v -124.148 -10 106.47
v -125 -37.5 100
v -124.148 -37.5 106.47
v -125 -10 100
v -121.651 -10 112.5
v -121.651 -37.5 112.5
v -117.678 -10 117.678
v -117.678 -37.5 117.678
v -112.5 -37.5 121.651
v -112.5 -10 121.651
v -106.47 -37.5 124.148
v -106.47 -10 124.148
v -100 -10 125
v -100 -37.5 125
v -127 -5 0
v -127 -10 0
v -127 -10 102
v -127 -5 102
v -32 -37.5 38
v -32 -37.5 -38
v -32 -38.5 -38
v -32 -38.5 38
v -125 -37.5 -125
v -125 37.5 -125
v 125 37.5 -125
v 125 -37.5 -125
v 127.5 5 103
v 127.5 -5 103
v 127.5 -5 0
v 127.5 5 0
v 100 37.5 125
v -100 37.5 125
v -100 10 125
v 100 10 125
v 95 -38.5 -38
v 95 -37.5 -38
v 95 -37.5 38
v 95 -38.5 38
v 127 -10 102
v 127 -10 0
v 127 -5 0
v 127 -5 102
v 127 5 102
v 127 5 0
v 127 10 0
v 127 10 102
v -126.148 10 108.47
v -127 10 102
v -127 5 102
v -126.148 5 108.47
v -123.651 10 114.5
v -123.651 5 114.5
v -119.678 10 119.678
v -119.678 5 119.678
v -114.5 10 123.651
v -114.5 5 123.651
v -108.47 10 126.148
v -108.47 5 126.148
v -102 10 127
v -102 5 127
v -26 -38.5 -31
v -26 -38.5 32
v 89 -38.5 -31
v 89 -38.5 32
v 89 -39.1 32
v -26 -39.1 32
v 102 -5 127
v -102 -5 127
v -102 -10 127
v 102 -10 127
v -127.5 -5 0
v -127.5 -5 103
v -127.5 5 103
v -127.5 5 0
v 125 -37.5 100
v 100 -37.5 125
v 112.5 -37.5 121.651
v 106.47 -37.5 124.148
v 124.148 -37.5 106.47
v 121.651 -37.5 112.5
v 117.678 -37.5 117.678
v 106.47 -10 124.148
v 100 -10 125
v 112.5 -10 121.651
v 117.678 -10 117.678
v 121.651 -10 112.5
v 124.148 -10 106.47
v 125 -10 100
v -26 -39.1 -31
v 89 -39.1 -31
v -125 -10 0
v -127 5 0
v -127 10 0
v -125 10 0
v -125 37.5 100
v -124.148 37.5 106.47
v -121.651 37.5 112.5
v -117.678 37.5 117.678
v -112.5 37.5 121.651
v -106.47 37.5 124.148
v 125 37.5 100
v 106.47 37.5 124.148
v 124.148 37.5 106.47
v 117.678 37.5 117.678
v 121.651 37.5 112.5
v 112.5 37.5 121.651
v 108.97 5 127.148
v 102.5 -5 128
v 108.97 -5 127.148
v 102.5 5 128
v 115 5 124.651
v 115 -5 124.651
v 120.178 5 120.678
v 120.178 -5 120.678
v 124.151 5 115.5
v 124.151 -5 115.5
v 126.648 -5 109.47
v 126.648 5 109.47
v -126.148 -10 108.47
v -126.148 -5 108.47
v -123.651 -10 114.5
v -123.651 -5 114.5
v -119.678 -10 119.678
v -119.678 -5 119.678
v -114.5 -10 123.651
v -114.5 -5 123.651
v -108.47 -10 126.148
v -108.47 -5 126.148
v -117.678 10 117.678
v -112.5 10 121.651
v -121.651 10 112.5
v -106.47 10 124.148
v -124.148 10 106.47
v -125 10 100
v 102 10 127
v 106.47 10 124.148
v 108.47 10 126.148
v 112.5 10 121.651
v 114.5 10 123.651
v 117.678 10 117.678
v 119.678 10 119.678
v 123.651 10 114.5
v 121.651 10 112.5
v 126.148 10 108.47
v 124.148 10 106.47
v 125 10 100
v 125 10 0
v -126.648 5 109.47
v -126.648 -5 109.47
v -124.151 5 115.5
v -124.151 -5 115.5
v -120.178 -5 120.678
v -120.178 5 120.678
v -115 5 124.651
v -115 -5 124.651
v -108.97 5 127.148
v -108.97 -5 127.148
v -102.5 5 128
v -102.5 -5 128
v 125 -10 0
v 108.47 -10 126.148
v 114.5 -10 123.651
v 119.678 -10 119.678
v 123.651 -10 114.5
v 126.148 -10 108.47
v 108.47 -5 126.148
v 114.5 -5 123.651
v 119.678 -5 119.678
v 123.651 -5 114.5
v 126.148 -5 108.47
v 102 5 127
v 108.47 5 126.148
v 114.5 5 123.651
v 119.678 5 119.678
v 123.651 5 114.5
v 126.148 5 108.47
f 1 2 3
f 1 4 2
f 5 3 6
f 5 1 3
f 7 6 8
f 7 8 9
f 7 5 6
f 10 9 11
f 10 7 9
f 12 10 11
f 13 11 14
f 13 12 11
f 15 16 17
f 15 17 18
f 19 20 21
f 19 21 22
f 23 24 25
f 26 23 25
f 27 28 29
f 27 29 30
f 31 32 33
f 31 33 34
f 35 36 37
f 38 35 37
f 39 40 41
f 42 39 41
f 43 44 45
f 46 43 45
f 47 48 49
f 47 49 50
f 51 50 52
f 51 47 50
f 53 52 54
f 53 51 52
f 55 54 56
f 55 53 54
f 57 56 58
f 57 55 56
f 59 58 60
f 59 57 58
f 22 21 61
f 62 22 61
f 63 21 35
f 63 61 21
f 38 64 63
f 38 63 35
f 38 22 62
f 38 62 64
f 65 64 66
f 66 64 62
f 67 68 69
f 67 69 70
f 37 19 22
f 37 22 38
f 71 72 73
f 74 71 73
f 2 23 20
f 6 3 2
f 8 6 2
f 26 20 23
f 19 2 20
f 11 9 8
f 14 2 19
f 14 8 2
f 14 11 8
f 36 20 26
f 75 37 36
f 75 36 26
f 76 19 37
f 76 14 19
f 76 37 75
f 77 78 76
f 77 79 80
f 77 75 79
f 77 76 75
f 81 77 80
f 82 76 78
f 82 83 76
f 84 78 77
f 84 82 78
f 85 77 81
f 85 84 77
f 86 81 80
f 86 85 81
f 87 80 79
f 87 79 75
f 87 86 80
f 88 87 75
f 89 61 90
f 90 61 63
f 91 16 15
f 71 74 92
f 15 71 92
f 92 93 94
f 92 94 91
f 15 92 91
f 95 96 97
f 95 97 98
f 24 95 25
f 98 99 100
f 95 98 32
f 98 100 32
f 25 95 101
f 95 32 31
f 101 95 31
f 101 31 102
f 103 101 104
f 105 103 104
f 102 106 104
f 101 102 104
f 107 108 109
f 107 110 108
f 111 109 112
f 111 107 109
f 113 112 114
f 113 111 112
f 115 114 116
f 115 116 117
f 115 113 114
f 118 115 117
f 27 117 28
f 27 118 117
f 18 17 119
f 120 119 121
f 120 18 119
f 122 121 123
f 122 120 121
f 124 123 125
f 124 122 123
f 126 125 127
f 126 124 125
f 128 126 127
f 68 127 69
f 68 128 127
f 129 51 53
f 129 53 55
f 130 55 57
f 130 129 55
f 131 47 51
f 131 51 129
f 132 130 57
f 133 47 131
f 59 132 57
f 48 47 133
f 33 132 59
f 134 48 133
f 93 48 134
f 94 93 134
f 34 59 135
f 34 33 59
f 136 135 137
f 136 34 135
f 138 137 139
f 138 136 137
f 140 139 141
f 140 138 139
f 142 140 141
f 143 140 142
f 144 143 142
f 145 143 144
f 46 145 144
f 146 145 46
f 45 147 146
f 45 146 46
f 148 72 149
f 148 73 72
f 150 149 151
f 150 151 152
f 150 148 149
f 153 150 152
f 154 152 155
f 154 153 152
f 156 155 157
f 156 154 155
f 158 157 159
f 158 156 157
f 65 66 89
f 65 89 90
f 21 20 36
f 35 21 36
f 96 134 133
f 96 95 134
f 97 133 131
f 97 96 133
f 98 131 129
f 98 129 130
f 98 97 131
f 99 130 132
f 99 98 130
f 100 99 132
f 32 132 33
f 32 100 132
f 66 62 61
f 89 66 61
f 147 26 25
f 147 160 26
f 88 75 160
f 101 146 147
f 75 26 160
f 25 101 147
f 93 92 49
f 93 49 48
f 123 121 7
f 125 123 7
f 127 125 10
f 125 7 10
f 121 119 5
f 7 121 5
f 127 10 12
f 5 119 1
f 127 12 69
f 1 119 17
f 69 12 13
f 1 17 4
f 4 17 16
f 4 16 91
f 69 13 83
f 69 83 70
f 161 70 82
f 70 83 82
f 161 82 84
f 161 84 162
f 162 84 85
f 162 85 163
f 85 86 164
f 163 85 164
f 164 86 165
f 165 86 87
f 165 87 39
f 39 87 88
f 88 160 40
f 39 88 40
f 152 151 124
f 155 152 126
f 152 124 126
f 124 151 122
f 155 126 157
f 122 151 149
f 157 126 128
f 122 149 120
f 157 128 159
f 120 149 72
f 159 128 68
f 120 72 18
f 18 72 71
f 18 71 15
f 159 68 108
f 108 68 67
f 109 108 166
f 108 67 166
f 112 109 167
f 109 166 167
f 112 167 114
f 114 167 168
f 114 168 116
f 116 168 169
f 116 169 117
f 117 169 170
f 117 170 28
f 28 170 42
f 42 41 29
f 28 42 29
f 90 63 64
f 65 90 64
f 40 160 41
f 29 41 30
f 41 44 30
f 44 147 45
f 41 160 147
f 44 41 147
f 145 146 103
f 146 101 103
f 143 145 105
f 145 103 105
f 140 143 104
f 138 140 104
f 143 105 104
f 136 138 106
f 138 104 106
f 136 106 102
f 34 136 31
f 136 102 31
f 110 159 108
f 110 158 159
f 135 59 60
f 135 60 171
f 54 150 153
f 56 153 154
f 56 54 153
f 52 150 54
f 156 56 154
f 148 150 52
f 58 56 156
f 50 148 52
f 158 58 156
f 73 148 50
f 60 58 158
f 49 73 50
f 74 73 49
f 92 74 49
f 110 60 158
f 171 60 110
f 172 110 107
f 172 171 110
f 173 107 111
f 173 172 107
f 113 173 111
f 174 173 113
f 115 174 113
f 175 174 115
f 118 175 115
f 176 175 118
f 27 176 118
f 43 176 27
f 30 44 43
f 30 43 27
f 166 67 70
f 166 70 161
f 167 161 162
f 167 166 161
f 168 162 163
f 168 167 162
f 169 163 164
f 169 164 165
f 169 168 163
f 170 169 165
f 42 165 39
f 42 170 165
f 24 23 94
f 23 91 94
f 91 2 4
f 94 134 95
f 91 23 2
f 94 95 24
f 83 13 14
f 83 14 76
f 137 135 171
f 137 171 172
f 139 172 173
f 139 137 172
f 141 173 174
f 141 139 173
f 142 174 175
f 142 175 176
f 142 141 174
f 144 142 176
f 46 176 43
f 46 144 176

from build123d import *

# Parameters (mm, degrees)
F0_W      = 250
F0_H      = 75
F2_DEPTH  = 125
F1_W      = 254
F1_H      = 20
F3_DEPTH  = 127
F4_R      = 25
F5_W      = 255
F5_H      = 10
F6_DEPTH  = 128
F7_R      = 25
F8_W      = 127
F8_H      = 76
F9_DEPTH  = 1
F11_DEPTH = 0.6


with BuildPart() as f2:
    # F0 (on Top) → F2 (new body, symmetric)
    with BuildSketch(Plane.XY):
        Rectangle(F0_W, F0_H)
    extrude(amount=F2_DEPTH, both=True)

    # F1 (on Top) → F3 (join)
    with BuildSketch(Plane.XY):
        Rectangle(F1_W, F1_H)
    extrude(amount=F3_DEPTH)

    # F4
    f4_edges = [f2.edges().sort_by_distance(p)[0] for p in [
        (-127, 0, 127),
        (-125, 23.75, 125),
        (-125, -23.75, 125),
        (125, 23.75, 125),
        (125, -23.75, 125),
        (127, 0, 127),
    ]]
    fillet(f4_edges, radius=F4_R)

    # F5 (on Top) → F6 (join)
    with BuildSketch(Plane.XY):
        Rectangle(F5_W, F5_H)
    extrude(amount=F6_DEPTH)

    # F7
    f7_edges = [f2.edges().sort_by_distance(p)[0] for p in [
        (-127.5, 0, 128),
        (127.5, 0, 128),
    ]]
    fillet(f7_edges, radius=F7_R)

    # F8 (on face) → F9 (join)
    with BuildSketch(Plane.XZ.offset(37.5)):
        with Locations((31.5, 0)):
            Rectangle(F8_W, F8_H)
    extrude(amount=F9_DEPTH)

    # F10 (on face) → F11 (join)
    with BuildSketch(Plane.XZ.offset(38.5)):
        Polygon((-26, 32), (-26, -31), (89, -31), (89, 32), (76.5, 26), (-13.5, 26), align=None)
        Polygon((89, 32), (-26, 32), (-13.5, 26), (76.5, 26), align=None)
    extrude(amount=F11_DEPTH)


solid = f2.part
